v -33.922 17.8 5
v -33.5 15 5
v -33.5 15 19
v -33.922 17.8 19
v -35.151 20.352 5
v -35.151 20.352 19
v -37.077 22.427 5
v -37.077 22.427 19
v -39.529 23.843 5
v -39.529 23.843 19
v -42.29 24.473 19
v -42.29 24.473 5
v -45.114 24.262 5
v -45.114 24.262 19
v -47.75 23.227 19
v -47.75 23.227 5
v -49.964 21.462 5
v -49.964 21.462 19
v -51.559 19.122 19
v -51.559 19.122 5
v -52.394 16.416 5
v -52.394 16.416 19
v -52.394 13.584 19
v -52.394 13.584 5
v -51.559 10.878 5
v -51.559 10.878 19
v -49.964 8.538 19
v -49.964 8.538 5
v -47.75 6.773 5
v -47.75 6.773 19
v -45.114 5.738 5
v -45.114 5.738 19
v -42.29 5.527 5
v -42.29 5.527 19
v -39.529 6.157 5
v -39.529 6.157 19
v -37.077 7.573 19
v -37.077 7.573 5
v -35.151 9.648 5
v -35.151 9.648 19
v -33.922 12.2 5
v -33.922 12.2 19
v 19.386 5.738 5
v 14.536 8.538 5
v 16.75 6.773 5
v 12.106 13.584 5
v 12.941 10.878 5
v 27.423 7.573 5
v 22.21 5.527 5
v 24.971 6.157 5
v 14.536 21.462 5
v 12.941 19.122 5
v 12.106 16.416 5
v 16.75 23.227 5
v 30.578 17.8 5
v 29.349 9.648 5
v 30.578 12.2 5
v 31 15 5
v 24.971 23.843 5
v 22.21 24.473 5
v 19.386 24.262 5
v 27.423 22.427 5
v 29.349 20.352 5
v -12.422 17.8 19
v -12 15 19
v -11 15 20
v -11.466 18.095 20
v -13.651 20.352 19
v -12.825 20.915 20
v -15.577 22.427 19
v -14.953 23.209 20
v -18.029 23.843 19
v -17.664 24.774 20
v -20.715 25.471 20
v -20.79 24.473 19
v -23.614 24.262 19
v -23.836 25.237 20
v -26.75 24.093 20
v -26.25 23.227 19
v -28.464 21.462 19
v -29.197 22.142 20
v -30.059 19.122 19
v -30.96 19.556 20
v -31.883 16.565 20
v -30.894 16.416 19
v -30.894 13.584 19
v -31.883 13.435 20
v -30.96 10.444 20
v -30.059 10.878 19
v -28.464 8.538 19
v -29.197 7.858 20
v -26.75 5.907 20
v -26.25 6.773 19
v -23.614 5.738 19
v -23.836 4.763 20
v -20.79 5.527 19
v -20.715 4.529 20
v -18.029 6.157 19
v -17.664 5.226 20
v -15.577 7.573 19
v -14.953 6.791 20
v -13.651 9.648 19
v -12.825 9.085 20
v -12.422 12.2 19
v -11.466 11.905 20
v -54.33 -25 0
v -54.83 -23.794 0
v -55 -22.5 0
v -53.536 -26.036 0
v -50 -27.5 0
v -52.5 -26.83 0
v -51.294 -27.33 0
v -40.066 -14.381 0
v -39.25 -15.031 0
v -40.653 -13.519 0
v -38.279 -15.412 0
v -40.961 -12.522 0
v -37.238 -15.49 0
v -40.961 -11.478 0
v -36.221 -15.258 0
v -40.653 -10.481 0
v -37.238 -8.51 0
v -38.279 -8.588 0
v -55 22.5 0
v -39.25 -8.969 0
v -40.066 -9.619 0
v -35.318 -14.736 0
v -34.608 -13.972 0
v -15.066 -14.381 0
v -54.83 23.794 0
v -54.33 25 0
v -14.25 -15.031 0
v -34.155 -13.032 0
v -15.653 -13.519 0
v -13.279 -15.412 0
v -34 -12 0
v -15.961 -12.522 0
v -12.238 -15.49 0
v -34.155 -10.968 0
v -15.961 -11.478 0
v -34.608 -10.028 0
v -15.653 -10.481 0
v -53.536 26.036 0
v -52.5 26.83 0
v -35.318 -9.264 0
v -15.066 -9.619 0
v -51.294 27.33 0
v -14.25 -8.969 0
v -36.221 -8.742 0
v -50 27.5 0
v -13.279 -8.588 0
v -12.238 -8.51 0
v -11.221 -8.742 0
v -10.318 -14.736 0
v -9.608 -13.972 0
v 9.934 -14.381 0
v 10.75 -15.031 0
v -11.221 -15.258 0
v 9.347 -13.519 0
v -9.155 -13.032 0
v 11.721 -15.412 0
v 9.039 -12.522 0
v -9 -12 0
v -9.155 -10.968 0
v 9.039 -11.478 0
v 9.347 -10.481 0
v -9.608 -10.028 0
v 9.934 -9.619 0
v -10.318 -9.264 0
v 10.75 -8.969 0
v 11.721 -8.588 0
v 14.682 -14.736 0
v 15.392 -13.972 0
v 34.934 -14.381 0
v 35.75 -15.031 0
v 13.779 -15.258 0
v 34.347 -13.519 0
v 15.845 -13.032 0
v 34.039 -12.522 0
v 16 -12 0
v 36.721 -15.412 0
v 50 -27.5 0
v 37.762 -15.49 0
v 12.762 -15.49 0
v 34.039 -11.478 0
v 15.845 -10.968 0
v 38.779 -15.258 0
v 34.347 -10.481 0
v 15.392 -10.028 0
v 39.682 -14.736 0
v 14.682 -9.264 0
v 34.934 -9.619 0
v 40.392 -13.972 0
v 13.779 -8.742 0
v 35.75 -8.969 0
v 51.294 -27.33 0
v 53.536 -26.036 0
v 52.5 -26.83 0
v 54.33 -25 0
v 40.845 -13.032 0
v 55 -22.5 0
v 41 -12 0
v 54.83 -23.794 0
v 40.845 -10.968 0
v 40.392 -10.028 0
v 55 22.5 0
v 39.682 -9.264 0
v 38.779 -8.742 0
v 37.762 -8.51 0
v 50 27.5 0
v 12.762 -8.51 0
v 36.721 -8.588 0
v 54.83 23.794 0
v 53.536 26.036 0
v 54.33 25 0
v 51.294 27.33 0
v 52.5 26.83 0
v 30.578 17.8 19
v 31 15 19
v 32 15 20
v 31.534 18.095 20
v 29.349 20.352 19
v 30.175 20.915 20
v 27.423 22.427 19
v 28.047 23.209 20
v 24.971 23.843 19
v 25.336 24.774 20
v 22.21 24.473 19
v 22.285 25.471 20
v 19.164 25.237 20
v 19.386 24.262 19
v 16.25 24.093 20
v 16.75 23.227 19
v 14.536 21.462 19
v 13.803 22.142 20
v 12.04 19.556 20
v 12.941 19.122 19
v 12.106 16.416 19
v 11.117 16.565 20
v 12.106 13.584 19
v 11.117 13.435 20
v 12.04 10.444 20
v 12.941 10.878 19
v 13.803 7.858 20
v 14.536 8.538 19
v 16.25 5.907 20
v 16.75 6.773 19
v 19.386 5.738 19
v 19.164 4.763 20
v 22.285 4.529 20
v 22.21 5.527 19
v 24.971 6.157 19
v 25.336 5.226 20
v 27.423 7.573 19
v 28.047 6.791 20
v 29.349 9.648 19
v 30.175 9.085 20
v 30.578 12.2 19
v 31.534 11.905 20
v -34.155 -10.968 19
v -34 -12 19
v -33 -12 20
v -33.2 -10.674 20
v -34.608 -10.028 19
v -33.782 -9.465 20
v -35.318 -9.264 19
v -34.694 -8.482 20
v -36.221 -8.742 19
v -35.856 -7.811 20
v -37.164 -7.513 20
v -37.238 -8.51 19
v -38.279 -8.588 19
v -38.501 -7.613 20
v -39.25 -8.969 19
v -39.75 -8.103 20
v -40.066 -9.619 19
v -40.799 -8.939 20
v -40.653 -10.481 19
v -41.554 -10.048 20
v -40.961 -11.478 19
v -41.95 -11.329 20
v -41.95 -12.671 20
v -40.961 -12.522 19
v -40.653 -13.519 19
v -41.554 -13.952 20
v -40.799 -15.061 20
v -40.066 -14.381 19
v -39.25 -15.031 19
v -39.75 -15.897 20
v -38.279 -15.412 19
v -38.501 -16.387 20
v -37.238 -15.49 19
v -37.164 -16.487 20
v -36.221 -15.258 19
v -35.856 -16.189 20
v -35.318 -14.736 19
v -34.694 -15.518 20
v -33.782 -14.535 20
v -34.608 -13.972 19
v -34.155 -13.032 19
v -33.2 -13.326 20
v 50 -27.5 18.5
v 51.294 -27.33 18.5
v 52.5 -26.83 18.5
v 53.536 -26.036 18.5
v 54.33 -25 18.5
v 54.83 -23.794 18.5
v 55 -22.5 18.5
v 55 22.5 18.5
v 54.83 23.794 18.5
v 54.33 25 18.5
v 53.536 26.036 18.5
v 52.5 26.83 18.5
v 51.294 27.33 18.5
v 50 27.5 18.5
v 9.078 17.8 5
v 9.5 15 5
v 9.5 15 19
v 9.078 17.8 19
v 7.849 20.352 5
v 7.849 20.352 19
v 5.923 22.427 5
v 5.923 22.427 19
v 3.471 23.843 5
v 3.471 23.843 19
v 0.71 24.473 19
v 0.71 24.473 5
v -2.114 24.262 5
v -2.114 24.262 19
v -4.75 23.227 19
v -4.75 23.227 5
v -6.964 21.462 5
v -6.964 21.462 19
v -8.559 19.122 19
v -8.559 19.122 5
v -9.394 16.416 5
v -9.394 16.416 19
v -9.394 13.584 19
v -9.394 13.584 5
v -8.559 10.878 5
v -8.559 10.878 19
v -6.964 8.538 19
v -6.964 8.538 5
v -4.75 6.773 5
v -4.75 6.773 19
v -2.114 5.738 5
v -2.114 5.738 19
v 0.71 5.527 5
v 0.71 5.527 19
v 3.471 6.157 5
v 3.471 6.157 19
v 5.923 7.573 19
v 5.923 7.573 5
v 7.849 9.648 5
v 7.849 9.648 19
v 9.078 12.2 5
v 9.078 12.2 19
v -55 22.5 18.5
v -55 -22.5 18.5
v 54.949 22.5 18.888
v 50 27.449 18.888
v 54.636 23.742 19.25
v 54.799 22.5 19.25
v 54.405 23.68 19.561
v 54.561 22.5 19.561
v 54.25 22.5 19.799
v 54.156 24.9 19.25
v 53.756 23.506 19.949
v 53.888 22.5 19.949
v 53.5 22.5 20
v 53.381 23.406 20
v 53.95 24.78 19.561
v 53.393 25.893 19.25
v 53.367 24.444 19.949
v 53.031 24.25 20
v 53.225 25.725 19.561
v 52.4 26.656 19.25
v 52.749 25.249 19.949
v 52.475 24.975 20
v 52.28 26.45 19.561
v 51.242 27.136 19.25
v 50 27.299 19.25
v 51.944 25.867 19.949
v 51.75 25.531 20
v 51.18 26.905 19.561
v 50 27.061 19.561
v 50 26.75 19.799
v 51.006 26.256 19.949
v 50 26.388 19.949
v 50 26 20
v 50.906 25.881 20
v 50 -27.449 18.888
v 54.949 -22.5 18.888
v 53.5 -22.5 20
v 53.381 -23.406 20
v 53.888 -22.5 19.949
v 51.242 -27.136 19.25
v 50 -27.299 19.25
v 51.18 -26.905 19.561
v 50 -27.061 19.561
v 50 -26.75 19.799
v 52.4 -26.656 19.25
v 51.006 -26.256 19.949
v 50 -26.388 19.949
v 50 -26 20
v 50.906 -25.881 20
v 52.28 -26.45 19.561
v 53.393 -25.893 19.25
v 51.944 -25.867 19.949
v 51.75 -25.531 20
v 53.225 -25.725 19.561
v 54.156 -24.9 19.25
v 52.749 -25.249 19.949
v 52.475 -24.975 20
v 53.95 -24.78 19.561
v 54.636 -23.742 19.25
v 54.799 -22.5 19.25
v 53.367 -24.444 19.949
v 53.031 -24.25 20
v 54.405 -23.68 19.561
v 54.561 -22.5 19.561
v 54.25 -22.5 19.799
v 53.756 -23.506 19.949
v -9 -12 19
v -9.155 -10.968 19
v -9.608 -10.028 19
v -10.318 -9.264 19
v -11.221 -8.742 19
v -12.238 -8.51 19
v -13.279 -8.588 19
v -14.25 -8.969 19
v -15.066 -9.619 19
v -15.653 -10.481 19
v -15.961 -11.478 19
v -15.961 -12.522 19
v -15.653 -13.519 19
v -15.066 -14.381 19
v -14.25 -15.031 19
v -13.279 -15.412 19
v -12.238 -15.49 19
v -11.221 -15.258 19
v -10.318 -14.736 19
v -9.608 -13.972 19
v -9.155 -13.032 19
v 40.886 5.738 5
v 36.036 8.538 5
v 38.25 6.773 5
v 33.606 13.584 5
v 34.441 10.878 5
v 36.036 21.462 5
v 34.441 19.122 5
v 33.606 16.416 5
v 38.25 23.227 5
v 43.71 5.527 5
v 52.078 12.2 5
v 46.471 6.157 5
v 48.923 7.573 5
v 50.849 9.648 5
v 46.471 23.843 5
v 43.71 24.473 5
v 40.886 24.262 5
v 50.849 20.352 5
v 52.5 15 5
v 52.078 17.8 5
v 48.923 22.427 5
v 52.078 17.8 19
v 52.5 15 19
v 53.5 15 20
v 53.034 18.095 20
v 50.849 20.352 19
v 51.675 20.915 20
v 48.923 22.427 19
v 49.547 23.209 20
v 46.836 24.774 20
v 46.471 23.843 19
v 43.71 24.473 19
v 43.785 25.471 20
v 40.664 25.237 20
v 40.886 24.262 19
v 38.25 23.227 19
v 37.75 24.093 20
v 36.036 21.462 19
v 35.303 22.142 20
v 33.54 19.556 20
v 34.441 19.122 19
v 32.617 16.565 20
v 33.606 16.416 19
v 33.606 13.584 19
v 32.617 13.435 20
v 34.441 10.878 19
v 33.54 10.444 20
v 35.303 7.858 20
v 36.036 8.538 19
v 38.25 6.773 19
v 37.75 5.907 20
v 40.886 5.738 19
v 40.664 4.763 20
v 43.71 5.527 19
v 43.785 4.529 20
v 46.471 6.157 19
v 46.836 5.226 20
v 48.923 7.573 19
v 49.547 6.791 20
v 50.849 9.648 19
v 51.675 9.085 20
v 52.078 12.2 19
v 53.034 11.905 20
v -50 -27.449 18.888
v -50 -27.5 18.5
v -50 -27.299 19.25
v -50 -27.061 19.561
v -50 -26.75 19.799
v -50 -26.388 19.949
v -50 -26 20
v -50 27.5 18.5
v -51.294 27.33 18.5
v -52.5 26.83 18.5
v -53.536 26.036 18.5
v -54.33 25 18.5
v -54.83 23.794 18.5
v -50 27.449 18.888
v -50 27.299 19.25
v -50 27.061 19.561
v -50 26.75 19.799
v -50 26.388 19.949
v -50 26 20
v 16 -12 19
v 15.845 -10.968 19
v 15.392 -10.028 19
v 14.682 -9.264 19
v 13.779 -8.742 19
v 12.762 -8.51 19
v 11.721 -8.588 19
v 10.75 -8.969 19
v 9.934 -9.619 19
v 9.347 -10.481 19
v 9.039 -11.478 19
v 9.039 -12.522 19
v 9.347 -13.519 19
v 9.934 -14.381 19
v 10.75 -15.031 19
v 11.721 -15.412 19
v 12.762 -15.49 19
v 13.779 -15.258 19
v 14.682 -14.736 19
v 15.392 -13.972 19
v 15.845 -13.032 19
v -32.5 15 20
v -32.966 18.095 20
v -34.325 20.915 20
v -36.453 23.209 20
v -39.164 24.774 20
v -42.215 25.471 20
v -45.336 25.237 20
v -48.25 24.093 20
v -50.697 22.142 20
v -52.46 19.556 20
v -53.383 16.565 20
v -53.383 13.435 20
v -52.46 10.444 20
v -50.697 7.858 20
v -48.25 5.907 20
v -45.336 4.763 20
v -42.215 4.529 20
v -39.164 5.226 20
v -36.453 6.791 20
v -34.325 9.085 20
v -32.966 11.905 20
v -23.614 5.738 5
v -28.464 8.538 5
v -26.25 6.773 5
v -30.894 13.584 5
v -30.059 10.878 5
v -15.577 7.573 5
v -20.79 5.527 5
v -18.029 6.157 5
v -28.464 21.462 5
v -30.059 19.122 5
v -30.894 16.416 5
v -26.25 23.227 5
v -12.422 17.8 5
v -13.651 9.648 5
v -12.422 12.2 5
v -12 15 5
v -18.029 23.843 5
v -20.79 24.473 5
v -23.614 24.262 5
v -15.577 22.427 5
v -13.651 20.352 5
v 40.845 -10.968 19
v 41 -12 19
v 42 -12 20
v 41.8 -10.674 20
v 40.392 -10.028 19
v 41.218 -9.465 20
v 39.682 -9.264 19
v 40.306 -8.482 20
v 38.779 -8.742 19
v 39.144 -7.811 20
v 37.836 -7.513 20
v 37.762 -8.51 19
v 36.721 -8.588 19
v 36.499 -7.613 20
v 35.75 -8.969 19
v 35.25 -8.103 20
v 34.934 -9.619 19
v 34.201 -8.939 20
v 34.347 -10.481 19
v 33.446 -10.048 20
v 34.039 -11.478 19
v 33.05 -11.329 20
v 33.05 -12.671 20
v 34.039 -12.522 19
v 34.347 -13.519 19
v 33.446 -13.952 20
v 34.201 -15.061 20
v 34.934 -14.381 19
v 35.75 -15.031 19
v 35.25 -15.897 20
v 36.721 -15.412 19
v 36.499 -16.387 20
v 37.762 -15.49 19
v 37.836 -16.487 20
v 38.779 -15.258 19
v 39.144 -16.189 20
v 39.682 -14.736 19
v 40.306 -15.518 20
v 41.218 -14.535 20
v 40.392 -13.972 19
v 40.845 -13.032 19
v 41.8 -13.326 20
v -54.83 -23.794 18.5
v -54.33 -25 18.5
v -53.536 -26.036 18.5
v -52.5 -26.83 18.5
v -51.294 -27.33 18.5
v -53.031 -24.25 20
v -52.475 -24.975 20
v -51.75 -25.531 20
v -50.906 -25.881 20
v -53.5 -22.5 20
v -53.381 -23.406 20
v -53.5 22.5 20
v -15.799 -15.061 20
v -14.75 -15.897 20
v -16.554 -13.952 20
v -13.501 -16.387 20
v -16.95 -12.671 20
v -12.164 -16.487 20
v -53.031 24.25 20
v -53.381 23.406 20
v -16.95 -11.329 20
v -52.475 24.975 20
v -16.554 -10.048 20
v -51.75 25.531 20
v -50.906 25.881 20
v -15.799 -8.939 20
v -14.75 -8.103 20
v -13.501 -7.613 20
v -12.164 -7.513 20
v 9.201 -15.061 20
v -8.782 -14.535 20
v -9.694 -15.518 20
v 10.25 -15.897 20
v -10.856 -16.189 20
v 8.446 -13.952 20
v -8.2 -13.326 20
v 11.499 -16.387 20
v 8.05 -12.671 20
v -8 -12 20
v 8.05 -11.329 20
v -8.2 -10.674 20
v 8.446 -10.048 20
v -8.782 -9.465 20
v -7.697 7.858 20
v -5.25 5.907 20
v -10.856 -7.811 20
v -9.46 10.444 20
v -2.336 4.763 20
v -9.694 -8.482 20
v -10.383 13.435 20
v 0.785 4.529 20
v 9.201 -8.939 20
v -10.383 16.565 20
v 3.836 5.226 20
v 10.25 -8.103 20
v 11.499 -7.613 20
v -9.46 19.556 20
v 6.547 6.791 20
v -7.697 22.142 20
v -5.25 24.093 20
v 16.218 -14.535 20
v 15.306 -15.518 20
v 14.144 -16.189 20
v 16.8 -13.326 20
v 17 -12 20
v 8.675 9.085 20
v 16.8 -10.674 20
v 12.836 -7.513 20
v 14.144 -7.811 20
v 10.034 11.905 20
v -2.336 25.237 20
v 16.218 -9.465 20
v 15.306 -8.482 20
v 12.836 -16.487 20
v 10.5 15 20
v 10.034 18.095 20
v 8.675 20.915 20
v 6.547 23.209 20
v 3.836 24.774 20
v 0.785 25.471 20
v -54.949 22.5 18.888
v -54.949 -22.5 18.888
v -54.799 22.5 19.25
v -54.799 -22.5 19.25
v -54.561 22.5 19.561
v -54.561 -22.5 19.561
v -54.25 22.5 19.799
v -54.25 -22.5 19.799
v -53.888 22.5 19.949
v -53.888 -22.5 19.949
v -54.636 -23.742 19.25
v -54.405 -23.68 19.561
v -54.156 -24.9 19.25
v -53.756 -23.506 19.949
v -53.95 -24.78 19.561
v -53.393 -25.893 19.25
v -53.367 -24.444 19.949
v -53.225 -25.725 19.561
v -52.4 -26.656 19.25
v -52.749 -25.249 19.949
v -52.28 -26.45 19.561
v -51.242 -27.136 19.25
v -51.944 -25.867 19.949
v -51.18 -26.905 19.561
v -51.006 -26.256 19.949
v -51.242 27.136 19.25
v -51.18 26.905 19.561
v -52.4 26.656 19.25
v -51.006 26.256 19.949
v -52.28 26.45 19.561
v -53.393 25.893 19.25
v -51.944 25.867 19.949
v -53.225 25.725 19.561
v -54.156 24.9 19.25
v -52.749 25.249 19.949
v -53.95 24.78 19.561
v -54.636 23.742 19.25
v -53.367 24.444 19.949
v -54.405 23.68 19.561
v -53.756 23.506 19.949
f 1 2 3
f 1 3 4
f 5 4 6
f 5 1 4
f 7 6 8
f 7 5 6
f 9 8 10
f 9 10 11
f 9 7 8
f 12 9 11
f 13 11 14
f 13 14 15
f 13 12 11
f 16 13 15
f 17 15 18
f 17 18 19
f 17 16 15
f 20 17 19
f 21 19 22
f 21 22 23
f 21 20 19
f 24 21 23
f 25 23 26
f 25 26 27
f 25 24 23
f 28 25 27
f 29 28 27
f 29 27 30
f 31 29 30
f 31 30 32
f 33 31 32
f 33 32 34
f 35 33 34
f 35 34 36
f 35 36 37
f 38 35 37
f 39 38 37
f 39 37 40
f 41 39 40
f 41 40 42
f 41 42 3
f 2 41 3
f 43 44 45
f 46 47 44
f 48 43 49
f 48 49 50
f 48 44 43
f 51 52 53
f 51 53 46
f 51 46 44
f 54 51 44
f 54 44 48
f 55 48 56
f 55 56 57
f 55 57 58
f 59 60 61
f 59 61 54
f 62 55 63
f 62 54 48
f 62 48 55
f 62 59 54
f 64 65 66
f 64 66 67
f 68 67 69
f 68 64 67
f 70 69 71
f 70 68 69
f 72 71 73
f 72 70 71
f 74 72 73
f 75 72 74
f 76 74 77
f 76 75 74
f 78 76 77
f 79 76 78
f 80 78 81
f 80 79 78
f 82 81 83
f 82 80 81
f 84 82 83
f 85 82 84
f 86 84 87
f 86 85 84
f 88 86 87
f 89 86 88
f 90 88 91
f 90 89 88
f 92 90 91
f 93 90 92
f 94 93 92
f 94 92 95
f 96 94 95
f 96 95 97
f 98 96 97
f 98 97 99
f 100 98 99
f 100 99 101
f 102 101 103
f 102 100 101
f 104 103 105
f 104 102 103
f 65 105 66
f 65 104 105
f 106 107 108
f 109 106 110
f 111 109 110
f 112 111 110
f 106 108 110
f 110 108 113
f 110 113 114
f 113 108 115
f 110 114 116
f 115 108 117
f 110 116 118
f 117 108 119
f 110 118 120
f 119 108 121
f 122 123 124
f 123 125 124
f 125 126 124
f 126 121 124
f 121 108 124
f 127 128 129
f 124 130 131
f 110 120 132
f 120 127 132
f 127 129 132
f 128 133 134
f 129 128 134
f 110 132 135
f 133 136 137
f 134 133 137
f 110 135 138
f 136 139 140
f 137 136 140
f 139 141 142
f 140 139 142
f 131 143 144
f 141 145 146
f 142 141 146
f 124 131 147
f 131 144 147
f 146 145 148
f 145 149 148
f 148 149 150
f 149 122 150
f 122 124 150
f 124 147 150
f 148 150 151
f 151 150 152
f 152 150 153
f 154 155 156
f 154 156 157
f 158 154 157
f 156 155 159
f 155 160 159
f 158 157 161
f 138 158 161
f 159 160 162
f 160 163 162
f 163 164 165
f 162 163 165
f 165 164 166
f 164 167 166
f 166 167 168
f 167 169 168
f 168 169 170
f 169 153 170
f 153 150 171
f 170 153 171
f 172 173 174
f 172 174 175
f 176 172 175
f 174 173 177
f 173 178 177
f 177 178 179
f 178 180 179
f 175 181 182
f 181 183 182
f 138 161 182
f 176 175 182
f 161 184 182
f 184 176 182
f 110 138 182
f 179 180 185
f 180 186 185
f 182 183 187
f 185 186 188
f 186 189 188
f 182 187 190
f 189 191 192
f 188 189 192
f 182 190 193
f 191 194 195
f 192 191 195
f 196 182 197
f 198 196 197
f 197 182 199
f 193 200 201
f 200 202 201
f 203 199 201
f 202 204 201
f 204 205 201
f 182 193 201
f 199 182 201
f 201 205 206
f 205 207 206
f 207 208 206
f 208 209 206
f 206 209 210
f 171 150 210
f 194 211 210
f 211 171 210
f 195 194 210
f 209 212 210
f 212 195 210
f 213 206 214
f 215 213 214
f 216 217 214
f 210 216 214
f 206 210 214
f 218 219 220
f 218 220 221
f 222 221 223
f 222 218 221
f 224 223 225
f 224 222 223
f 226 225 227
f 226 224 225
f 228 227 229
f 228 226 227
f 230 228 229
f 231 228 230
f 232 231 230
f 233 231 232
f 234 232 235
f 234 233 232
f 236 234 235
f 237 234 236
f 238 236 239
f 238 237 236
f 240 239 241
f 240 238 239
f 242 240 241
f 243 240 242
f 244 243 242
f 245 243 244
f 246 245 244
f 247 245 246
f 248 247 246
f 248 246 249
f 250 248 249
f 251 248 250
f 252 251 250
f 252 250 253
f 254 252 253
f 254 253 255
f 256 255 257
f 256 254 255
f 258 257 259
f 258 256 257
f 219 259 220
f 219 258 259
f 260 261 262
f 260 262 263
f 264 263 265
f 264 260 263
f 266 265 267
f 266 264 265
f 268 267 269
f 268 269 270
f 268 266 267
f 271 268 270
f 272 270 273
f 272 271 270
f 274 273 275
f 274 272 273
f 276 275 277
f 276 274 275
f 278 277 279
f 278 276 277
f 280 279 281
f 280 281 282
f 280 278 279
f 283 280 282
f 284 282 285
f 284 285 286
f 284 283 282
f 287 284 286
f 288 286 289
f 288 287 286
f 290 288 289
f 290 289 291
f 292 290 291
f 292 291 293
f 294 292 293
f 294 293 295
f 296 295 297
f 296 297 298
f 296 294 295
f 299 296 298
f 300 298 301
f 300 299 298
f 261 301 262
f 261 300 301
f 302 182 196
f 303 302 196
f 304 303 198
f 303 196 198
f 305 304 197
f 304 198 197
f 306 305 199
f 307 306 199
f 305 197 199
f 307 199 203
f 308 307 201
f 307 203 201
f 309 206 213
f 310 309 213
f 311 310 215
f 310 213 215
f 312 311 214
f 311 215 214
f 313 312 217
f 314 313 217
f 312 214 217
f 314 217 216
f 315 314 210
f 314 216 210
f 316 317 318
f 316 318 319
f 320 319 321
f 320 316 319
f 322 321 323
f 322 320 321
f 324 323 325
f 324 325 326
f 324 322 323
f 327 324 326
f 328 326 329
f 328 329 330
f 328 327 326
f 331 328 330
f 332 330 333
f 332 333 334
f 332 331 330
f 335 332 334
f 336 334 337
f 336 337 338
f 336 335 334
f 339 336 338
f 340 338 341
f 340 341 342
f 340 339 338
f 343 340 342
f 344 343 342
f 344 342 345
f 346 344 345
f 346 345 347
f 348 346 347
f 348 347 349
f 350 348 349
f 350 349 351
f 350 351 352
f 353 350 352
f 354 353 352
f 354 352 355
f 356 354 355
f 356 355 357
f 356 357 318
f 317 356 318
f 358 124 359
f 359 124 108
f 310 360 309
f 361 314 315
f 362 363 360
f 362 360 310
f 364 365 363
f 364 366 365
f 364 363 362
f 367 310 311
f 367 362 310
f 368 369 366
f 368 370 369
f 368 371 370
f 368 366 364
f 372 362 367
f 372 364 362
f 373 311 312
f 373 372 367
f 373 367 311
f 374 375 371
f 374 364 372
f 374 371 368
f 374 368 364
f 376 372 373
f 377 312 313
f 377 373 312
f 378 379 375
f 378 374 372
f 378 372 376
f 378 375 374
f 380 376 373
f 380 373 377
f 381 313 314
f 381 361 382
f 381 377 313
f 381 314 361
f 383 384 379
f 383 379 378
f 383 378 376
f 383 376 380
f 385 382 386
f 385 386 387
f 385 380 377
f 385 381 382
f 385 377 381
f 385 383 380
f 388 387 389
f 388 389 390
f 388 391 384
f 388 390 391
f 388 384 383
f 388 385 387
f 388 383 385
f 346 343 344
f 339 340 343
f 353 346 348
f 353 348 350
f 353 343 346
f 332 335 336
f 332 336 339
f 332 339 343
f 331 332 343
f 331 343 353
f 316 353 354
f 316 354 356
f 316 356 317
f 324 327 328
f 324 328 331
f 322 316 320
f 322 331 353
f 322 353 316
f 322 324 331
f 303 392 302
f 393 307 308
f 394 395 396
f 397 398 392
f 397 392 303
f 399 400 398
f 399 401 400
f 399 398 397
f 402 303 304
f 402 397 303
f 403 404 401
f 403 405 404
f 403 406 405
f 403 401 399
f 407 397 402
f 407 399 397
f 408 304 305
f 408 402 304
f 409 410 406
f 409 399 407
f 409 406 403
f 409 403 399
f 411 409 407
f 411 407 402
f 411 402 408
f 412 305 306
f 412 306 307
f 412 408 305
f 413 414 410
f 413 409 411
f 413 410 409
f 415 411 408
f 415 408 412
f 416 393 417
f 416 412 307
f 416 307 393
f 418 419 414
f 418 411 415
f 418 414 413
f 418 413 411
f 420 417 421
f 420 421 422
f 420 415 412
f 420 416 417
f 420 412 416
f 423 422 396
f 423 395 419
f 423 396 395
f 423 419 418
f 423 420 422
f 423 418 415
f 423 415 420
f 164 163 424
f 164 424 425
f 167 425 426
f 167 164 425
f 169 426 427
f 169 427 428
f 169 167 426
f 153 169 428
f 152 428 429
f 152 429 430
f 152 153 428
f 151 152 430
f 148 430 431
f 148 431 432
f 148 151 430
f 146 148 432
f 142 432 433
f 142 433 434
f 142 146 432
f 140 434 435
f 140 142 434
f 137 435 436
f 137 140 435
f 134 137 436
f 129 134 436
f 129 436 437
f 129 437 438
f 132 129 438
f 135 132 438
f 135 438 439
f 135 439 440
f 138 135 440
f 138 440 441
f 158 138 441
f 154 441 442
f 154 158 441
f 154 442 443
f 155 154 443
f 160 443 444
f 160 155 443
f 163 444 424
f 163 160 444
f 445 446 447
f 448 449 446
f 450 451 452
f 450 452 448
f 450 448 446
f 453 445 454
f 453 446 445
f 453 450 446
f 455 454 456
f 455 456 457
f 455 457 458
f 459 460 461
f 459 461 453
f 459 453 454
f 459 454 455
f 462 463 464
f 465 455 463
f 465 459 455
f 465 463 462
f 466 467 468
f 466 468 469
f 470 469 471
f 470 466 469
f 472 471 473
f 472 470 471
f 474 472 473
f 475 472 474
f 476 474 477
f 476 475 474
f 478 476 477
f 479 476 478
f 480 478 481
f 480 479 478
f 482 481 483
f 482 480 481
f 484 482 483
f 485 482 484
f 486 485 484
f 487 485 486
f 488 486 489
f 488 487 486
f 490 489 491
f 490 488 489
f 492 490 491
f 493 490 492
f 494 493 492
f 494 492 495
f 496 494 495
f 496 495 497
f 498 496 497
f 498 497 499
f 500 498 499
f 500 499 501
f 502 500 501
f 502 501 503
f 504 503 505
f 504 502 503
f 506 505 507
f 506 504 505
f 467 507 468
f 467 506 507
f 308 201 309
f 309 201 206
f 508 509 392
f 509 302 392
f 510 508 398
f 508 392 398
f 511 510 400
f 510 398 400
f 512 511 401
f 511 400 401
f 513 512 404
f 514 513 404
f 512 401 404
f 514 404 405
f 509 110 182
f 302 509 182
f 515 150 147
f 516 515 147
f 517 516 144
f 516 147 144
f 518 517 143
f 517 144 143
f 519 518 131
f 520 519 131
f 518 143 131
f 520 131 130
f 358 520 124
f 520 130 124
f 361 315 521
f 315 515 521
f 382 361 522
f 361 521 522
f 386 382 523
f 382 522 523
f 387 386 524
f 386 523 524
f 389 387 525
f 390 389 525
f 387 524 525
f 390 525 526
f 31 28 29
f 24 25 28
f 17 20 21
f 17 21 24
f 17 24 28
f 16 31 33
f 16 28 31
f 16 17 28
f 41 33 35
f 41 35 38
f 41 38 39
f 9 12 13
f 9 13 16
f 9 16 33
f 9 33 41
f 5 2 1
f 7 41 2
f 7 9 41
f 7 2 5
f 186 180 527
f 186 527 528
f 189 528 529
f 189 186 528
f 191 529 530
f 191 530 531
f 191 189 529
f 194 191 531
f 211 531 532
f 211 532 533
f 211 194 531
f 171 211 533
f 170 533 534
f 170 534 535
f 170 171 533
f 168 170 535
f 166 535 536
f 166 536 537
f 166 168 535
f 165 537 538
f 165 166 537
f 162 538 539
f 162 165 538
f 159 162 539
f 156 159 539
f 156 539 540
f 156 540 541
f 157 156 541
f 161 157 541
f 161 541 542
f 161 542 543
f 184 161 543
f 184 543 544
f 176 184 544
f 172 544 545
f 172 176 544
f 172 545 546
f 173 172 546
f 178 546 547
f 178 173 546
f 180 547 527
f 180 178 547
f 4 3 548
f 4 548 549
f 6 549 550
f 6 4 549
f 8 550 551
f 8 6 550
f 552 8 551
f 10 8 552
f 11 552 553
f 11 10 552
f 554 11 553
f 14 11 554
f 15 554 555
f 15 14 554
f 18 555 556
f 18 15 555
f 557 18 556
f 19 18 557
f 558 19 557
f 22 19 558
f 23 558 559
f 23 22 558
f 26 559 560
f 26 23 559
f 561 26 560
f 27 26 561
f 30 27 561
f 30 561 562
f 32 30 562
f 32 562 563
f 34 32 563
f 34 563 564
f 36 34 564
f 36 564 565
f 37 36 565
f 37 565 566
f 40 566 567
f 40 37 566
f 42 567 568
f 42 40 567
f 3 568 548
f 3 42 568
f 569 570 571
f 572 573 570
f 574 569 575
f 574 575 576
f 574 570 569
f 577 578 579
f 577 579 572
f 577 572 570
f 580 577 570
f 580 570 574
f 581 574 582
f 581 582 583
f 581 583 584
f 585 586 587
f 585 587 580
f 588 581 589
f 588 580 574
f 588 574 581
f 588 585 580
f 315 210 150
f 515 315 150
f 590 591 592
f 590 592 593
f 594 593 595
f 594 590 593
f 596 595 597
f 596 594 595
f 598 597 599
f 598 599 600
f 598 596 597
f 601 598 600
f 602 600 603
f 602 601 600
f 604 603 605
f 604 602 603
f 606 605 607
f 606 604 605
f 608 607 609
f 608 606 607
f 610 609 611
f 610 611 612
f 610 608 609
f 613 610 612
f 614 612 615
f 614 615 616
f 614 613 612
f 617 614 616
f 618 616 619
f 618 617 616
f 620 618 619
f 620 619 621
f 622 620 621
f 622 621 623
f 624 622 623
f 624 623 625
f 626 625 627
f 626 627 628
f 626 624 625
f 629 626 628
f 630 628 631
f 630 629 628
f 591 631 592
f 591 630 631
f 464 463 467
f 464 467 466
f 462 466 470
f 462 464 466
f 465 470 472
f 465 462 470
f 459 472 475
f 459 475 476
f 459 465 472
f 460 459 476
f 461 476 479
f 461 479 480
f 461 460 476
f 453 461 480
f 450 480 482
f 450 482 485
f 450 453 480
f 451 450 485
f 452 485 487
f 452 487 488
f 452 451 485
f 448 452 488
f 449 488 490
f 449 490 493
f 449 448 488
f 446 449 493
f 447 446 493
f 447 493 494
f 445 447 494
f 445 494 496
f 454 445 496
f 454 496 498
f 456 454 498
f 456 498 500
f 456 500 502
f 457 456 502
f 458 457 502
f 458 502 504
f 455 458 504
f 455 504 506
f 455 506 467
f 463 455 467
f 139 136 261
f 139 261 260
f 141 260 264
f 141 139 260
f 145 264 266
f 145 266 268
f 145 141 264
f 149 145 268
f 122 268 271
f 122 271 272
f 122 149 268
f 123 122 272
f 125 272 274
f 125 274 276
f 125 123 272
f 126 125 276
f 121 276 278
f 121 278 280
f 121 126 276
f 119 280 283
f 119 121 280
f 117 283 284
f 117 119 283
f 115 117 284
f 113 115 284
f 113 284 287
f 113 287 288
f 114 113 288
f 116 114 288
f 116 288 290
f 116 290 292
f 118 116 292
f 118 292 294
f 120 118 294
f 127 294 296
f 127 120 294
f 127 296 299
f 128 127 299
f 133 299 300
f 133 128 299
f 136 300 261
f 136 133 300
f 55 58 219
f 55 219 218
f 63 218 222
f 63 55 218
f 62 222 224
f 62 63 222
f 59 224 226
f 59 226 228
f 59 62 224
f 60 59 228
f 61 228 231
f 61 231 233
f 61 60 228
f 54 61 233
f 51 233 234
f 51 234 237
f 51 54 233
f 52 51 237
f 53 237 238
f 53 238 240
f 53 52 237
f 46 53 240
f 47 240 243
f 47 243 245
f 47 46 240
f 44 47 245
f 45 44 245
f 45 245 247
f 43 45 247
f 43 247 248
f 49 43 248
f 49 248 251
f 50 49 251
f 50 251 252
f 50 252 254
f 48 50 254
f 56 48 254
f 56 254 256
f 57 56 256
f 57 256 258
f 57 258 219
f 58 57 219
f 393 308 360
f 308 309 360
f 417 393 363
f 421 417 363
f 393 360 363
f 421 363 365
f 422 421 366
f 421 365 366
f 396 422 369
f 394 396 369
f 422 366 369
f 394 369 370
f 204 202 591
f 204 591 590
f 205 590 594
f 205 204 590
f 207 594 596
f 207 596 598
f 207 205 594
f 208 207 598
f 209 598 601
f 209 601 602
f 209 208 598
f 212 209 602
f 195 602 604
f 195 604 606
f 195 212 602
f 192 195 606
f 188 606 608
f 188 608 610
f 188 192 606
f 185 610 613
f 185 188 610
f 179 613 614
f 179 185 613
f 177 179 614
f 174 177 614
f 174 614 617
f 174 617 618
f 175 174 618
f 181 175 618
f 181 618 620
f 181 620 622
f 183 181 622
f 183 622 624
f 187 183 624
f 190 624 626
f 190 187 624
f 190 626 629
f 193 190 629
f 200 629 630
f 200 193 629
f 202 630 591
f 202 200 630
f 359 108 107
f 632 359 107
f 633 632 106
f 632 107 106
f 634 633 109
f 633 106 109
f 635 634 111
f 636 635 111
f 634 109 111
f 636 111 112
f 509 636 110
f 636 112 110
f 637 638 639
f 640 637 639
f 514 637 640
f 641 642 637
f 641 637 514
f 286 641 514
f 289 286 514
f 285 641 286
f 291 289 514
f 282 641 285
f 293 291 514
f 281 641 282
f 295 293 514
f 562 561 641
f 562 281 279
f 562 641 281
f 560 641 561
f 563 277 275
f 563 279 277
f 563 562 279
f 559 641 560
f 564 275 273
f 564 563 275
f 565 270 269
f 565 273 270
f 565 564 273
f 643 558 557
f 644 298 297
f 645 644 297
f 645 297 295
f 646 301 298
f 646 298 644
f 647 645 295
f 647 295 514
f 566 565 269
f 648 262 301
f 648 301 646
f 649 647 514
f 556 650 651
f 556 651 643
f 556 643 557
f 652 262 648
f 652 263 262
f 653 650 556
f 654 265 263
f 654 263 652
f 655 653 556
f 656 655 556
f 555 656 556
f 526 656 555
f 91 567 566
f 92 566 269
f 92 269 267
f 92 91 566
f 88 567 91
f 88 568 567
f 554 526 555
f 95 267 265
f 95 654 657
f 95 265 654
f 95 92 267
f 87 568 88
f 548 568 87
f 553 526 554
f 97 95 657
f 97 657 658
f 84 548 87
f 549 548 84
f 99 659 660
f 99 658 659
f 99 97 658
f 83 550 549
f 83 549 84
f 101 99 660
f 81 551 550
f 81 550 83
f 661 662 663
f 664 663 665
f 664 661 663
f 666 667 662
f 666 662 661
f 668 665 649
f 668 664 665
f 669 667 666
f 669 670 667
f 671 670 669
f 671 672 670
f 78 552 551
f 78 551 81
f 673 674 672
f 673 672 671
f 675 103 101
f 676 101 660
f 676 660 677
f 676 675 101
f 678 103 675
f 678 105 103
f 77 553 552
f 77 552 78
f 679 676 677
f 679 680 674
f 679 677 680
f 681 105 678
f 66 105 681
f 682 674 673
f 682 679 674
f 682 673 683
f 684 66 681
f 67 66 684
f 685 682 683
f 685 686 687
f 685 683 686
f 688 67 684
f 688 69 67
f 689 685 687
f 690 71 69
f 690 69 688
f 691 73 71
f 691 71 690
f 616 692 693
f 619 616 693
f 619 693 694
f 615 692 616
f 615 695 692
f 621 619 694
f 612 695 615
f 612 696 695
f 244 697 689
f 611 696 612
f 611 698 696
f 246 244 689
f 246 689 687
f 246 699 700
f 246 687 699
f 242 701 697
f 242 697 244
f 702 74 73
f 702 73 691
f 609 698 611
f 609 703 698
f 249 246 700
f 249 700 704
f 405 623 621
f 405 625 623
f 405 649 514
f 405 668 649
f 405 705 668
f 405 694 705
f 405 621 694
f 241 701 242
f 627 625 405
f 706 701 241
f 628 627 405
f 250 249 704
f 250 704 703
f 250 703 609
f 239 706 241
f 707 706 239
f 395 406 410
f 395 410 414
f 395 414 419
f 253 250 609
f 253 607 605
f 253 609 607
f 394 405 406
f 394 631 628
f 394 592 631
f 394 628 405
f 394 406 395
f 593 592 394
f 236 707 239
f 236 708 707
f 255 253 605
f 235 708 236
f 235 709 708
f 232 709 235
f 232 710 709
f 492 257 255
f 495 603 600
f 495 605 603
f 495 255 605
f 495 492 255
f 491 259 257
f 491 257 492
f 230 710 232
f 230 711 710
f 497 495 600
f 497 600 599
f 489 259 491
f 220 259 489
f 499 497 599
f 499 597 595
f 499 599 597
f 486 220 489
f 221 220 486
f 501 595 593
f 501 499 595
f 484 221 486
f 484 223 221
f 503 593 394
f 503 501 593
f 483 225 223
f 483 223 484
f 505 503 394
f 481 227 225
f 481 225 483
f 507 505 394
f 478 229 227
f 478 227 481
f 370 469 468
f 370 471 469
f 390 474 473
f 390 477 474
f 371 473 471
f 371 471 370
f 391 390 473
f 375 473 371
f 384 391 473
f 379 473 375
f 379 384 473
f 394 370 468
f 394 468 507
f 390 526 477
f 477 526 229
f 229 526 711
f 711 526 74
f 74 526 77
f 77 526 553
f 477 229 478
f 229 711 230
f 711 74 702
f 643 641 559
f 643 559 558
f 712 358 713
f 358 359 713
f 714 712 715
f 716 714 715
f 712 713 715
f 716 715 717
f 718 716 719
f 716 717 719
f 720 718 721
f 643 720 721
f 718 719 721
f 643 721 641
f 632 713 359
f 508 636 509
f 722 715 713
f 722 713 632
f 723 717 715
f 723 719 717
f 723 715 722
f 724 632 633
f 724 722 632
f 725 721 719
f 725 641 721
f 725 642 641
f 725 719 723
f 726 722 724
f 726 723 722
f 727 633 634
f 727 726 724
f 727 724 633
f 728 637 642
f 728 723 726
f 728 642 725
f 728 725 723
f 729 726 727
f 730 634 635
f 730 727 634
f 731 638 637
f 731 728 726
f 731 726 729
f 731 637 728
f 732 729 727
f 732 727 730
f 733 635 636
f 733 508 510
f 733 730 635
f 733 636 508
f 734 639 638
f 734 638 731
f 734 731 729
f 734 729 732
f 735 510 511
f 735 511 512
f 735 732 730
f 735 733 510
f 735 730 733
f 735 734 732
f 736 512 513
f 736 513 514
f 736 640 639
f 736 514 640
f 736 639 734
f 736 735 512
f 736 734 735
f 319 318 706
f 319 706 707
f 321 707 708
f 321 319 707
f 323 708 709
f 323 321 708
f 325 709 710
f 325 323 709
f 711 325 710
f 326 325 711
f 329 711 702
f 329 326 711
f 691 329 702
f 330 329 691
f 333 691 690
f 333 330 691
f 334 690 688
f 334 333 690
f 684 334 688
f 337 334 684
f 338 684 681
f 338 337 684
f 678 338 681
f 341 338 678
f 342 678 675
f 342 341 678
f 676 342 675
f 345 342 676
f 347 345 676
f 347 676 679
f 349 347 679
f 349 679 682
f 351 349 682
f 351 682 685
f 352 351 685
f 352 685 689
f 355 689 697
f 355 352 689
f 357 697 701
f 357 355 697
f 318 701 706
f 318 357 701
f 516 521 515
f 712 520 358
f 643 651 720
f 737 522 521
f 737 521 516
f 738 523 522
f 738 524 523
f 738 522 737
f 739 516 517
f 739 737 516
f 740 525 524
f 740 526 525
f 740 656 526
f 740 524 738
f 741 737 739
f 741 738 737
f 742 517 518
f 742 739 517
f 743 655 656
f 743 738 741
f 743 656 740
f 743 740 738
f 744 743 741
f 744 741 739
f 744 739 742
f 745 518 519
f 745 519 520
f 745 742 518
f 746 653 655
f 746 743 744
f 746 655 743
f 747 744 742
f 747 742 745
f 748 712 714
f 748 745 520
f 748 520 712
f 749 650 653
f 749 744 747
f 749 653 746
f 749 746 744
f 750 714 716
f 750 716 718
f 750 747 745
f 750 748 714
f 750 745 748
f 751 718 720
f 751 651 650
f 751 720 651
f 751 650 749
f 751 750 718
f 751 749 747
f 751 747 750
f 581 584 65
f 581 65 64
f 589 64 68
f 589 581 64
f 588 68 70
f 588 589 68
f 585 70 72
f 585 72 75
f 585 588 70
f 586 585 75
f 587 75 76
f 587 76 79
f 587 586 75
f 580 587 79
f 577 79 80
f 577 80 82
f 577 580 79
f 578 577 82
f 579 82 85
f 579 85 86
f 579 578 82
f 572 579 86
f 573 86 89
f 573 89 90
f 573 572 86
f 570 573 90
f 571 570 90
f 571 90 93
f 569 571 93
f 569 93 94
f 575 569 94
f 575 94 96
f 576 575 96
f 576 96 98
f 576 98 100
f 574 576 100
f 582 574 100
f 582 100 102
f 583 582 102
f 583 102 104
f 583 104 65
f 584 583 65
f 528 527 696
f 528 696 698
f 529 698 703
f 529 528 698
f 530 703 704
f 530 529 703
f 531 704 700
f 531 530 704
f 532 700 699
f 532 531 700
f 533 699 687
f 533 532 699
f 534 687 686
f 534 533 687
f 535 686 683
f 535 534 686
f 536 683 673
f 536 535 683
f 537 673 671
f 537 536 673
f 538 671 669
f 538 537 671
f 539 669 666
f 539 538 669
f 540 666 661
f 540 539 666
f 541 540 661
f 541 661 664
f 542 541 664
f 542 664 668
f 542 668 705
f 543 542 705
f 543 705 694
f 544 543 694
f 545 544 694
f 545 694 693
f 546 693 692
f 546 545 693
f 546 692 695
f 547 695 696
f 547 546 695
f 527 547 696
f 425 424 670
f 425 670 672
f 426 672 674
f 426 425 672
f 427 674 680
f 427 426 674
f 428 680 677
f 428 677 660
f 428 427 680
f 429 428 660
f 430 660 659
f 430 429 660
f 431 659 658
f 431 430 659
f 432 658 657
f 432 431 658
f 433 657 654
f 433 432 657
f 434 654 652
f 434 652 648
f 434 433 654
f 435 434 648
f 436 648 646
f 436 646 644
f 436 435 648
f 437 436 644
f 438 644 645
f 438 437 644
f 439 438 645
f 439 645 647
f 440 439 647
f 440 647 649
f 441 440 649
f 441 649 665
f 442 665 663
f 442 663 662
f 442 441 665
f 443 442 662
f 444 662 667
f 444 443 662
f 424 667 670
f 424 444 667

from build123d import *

# Parameters (mm, degrees)
F0_R     = 12.5
F0_R_2   = 9.5
F0_R_3   = 3.5
F1_DEPTH = 20
F2_DEPTH = 5
F3_R     = 1.5
F4_SIZE  = 0.99999
F5_SIZE  = 1


# Not quite as in the source:
# - a fillet or chamfer is up to 0.001 mm smaller than in the source, because OpenCascade refuses the exact size


with BuildPart() as f1:
    # F0 (on Top) → F1 (new body)
    with BuildSketch(Plane.XY):
        with BuildLine():
            Line((50, 27.5), (-50, 27.5))
            ThreePointArc((-50, 27.5), (-53.5355339059, 26.0355339059), (-55, 22.5))
            Line((-55, 22.5), (-55, -22.5))
            ThreePointArc((-55, -22.5), (-53.5355339059, -26.0355339059), (-50, -27.5))
            Line((-50, -27.5), (50, -27.5))
            ThreePointArc((50, -27.5), (53.5355339059, -26.0355339059), (55, -22.5))
            Line((55, -22.5), (55, 22.5))
            ThreePointArc((55, 22.5), (53.5355339059, 26.0355339059), (50, 27.5))
        make_face()
        with Locations((-37.5, -12)):
            Circle(F0_R, mode=Mode.SUBTRACT)
        with BuildLine():
            ThreePointArc((0, -12), (-12.5, -24.5), (-25, -12))
            ThreePointArc((-25, -12), (-12.5, 0.5), (0, -12))
        make_face(mode=Mode.SUBTRACT)
        with BuildLine():
            ThreePointArc((25, -12), (12.5, -24.5), (0, -12))
            ThreePointArc((0, -12), (12.5, 0.5), (25, -12))
        make_face(mode=Mode.SUBTRACT)
        with BuildLine():
            ThreePointArc((50, -12), (37.5, -24.5), (25, -12))
            ThreePointArc((25, -12), (37.5, 0.5), (50, -12))
        make_face(mode=Mode.SUBTRACT)
        with Locations((-43, 15)):
            Circle(F0_R_2, mode=Mode.SUBTRACT)
        with Locations((-21.5, 15)):
            Circle(F0_R_2, mode=Mode.SUBTRACT)
        with Locations((0, 15)):
            Circle(F0_R_2, mode=Mode.SUBTRACT)
        with Locations((21.5, 15)):
            Circle(F0_R_2, mode=Mode.SUBTRACT)
        with Locations((43, 15)):
            Circle(F0_R_2, mode=Mode.SUBTRACT)
        with BuildLine():
            ThreePointArc((0, -12), (-12.5, 0.5), (-25, -12))
            ThreePointArc((-25, -12), (-12.5, -24.5), (0, -12))
        make_face()
        with Locations((-12.5, -12)):
            Circle(F0_R_3, mode=Mode.SUBTRACT)
        with Locations((-37.5, -12)):
            Circle(F0_R)
        with Locations((-37.5, -12)):
            Circle(F0_R_3, mode=Mode.SUBTRACT)
        with BuildLine():
            ThreePointArc((25, -12), (12.5, 0.5), (0, -12))
            ThreePointArc((0, -12), (12.5, -24.5), (25, -12))
        make_face()
        with Locations((12.5, -12)):
            Circle(F0_R_3, mode=Mode.SUBTRACT)
        with BuildLine():
            ThreePointArc((50, -12), (37.5, 0.5), (25, -12))
            ThreePointArc((25, -12), (37.5, -24.5), (50, -12))
        make_face()
        with Locations((37.5, -12)):
            Circle(F0_R_3, mode=Mode.SUBTRACT)
    extrude(amount=F1_DEPTH)

    # F0 (on Top) → F2 (join)
    with BuildSketch(Plane.XY):
        with Locations((-43, 15)):
            Circle(F0_R_2)
        with Locations((-21.5, 15)):
            Circle(F0_R_2)
        with Locations((0, 15)):
            Circle(F0_R_2)
        with Locations((21.5, 15)):
            Circle(F0_R_2)
        with Locations((43, 15)):
            Circle(F0_R_2)
    extrude(amount=F2_DEPTH)

    # F3
    f3_edges = [f1.edges().sort_by_distance(p)[0] for p in [
        (0, -27.5, 20),
    ]]
    fillet(f3_edges, radius=F3_R)

    # F4 (size 1 in the source; OpenCascade refuses exactly that, so slightly less here)
    f4_edges = [f1.edges().sort_by_distance(p)[0] for p in [
        (-52.5, 15, 20),
        (-31, 15, 20),
        (-9.5, 15, 20),
        (12, 15, 20),
        (33.5, 15, 20),
    ]]
    chamfer(f4_edges, length=F4_SIZE)

    # F5
    f5_edges = [f1.edges().sort_by_distance(p)[0] for p in [
        (-41, -12, 20),
        (-16, -12, 20),
        (9, -12, 20),
        (34, -12, 20),
    ]]
    chamfer(f5_edges, length=F5_SIZE)


solid = f1.part
